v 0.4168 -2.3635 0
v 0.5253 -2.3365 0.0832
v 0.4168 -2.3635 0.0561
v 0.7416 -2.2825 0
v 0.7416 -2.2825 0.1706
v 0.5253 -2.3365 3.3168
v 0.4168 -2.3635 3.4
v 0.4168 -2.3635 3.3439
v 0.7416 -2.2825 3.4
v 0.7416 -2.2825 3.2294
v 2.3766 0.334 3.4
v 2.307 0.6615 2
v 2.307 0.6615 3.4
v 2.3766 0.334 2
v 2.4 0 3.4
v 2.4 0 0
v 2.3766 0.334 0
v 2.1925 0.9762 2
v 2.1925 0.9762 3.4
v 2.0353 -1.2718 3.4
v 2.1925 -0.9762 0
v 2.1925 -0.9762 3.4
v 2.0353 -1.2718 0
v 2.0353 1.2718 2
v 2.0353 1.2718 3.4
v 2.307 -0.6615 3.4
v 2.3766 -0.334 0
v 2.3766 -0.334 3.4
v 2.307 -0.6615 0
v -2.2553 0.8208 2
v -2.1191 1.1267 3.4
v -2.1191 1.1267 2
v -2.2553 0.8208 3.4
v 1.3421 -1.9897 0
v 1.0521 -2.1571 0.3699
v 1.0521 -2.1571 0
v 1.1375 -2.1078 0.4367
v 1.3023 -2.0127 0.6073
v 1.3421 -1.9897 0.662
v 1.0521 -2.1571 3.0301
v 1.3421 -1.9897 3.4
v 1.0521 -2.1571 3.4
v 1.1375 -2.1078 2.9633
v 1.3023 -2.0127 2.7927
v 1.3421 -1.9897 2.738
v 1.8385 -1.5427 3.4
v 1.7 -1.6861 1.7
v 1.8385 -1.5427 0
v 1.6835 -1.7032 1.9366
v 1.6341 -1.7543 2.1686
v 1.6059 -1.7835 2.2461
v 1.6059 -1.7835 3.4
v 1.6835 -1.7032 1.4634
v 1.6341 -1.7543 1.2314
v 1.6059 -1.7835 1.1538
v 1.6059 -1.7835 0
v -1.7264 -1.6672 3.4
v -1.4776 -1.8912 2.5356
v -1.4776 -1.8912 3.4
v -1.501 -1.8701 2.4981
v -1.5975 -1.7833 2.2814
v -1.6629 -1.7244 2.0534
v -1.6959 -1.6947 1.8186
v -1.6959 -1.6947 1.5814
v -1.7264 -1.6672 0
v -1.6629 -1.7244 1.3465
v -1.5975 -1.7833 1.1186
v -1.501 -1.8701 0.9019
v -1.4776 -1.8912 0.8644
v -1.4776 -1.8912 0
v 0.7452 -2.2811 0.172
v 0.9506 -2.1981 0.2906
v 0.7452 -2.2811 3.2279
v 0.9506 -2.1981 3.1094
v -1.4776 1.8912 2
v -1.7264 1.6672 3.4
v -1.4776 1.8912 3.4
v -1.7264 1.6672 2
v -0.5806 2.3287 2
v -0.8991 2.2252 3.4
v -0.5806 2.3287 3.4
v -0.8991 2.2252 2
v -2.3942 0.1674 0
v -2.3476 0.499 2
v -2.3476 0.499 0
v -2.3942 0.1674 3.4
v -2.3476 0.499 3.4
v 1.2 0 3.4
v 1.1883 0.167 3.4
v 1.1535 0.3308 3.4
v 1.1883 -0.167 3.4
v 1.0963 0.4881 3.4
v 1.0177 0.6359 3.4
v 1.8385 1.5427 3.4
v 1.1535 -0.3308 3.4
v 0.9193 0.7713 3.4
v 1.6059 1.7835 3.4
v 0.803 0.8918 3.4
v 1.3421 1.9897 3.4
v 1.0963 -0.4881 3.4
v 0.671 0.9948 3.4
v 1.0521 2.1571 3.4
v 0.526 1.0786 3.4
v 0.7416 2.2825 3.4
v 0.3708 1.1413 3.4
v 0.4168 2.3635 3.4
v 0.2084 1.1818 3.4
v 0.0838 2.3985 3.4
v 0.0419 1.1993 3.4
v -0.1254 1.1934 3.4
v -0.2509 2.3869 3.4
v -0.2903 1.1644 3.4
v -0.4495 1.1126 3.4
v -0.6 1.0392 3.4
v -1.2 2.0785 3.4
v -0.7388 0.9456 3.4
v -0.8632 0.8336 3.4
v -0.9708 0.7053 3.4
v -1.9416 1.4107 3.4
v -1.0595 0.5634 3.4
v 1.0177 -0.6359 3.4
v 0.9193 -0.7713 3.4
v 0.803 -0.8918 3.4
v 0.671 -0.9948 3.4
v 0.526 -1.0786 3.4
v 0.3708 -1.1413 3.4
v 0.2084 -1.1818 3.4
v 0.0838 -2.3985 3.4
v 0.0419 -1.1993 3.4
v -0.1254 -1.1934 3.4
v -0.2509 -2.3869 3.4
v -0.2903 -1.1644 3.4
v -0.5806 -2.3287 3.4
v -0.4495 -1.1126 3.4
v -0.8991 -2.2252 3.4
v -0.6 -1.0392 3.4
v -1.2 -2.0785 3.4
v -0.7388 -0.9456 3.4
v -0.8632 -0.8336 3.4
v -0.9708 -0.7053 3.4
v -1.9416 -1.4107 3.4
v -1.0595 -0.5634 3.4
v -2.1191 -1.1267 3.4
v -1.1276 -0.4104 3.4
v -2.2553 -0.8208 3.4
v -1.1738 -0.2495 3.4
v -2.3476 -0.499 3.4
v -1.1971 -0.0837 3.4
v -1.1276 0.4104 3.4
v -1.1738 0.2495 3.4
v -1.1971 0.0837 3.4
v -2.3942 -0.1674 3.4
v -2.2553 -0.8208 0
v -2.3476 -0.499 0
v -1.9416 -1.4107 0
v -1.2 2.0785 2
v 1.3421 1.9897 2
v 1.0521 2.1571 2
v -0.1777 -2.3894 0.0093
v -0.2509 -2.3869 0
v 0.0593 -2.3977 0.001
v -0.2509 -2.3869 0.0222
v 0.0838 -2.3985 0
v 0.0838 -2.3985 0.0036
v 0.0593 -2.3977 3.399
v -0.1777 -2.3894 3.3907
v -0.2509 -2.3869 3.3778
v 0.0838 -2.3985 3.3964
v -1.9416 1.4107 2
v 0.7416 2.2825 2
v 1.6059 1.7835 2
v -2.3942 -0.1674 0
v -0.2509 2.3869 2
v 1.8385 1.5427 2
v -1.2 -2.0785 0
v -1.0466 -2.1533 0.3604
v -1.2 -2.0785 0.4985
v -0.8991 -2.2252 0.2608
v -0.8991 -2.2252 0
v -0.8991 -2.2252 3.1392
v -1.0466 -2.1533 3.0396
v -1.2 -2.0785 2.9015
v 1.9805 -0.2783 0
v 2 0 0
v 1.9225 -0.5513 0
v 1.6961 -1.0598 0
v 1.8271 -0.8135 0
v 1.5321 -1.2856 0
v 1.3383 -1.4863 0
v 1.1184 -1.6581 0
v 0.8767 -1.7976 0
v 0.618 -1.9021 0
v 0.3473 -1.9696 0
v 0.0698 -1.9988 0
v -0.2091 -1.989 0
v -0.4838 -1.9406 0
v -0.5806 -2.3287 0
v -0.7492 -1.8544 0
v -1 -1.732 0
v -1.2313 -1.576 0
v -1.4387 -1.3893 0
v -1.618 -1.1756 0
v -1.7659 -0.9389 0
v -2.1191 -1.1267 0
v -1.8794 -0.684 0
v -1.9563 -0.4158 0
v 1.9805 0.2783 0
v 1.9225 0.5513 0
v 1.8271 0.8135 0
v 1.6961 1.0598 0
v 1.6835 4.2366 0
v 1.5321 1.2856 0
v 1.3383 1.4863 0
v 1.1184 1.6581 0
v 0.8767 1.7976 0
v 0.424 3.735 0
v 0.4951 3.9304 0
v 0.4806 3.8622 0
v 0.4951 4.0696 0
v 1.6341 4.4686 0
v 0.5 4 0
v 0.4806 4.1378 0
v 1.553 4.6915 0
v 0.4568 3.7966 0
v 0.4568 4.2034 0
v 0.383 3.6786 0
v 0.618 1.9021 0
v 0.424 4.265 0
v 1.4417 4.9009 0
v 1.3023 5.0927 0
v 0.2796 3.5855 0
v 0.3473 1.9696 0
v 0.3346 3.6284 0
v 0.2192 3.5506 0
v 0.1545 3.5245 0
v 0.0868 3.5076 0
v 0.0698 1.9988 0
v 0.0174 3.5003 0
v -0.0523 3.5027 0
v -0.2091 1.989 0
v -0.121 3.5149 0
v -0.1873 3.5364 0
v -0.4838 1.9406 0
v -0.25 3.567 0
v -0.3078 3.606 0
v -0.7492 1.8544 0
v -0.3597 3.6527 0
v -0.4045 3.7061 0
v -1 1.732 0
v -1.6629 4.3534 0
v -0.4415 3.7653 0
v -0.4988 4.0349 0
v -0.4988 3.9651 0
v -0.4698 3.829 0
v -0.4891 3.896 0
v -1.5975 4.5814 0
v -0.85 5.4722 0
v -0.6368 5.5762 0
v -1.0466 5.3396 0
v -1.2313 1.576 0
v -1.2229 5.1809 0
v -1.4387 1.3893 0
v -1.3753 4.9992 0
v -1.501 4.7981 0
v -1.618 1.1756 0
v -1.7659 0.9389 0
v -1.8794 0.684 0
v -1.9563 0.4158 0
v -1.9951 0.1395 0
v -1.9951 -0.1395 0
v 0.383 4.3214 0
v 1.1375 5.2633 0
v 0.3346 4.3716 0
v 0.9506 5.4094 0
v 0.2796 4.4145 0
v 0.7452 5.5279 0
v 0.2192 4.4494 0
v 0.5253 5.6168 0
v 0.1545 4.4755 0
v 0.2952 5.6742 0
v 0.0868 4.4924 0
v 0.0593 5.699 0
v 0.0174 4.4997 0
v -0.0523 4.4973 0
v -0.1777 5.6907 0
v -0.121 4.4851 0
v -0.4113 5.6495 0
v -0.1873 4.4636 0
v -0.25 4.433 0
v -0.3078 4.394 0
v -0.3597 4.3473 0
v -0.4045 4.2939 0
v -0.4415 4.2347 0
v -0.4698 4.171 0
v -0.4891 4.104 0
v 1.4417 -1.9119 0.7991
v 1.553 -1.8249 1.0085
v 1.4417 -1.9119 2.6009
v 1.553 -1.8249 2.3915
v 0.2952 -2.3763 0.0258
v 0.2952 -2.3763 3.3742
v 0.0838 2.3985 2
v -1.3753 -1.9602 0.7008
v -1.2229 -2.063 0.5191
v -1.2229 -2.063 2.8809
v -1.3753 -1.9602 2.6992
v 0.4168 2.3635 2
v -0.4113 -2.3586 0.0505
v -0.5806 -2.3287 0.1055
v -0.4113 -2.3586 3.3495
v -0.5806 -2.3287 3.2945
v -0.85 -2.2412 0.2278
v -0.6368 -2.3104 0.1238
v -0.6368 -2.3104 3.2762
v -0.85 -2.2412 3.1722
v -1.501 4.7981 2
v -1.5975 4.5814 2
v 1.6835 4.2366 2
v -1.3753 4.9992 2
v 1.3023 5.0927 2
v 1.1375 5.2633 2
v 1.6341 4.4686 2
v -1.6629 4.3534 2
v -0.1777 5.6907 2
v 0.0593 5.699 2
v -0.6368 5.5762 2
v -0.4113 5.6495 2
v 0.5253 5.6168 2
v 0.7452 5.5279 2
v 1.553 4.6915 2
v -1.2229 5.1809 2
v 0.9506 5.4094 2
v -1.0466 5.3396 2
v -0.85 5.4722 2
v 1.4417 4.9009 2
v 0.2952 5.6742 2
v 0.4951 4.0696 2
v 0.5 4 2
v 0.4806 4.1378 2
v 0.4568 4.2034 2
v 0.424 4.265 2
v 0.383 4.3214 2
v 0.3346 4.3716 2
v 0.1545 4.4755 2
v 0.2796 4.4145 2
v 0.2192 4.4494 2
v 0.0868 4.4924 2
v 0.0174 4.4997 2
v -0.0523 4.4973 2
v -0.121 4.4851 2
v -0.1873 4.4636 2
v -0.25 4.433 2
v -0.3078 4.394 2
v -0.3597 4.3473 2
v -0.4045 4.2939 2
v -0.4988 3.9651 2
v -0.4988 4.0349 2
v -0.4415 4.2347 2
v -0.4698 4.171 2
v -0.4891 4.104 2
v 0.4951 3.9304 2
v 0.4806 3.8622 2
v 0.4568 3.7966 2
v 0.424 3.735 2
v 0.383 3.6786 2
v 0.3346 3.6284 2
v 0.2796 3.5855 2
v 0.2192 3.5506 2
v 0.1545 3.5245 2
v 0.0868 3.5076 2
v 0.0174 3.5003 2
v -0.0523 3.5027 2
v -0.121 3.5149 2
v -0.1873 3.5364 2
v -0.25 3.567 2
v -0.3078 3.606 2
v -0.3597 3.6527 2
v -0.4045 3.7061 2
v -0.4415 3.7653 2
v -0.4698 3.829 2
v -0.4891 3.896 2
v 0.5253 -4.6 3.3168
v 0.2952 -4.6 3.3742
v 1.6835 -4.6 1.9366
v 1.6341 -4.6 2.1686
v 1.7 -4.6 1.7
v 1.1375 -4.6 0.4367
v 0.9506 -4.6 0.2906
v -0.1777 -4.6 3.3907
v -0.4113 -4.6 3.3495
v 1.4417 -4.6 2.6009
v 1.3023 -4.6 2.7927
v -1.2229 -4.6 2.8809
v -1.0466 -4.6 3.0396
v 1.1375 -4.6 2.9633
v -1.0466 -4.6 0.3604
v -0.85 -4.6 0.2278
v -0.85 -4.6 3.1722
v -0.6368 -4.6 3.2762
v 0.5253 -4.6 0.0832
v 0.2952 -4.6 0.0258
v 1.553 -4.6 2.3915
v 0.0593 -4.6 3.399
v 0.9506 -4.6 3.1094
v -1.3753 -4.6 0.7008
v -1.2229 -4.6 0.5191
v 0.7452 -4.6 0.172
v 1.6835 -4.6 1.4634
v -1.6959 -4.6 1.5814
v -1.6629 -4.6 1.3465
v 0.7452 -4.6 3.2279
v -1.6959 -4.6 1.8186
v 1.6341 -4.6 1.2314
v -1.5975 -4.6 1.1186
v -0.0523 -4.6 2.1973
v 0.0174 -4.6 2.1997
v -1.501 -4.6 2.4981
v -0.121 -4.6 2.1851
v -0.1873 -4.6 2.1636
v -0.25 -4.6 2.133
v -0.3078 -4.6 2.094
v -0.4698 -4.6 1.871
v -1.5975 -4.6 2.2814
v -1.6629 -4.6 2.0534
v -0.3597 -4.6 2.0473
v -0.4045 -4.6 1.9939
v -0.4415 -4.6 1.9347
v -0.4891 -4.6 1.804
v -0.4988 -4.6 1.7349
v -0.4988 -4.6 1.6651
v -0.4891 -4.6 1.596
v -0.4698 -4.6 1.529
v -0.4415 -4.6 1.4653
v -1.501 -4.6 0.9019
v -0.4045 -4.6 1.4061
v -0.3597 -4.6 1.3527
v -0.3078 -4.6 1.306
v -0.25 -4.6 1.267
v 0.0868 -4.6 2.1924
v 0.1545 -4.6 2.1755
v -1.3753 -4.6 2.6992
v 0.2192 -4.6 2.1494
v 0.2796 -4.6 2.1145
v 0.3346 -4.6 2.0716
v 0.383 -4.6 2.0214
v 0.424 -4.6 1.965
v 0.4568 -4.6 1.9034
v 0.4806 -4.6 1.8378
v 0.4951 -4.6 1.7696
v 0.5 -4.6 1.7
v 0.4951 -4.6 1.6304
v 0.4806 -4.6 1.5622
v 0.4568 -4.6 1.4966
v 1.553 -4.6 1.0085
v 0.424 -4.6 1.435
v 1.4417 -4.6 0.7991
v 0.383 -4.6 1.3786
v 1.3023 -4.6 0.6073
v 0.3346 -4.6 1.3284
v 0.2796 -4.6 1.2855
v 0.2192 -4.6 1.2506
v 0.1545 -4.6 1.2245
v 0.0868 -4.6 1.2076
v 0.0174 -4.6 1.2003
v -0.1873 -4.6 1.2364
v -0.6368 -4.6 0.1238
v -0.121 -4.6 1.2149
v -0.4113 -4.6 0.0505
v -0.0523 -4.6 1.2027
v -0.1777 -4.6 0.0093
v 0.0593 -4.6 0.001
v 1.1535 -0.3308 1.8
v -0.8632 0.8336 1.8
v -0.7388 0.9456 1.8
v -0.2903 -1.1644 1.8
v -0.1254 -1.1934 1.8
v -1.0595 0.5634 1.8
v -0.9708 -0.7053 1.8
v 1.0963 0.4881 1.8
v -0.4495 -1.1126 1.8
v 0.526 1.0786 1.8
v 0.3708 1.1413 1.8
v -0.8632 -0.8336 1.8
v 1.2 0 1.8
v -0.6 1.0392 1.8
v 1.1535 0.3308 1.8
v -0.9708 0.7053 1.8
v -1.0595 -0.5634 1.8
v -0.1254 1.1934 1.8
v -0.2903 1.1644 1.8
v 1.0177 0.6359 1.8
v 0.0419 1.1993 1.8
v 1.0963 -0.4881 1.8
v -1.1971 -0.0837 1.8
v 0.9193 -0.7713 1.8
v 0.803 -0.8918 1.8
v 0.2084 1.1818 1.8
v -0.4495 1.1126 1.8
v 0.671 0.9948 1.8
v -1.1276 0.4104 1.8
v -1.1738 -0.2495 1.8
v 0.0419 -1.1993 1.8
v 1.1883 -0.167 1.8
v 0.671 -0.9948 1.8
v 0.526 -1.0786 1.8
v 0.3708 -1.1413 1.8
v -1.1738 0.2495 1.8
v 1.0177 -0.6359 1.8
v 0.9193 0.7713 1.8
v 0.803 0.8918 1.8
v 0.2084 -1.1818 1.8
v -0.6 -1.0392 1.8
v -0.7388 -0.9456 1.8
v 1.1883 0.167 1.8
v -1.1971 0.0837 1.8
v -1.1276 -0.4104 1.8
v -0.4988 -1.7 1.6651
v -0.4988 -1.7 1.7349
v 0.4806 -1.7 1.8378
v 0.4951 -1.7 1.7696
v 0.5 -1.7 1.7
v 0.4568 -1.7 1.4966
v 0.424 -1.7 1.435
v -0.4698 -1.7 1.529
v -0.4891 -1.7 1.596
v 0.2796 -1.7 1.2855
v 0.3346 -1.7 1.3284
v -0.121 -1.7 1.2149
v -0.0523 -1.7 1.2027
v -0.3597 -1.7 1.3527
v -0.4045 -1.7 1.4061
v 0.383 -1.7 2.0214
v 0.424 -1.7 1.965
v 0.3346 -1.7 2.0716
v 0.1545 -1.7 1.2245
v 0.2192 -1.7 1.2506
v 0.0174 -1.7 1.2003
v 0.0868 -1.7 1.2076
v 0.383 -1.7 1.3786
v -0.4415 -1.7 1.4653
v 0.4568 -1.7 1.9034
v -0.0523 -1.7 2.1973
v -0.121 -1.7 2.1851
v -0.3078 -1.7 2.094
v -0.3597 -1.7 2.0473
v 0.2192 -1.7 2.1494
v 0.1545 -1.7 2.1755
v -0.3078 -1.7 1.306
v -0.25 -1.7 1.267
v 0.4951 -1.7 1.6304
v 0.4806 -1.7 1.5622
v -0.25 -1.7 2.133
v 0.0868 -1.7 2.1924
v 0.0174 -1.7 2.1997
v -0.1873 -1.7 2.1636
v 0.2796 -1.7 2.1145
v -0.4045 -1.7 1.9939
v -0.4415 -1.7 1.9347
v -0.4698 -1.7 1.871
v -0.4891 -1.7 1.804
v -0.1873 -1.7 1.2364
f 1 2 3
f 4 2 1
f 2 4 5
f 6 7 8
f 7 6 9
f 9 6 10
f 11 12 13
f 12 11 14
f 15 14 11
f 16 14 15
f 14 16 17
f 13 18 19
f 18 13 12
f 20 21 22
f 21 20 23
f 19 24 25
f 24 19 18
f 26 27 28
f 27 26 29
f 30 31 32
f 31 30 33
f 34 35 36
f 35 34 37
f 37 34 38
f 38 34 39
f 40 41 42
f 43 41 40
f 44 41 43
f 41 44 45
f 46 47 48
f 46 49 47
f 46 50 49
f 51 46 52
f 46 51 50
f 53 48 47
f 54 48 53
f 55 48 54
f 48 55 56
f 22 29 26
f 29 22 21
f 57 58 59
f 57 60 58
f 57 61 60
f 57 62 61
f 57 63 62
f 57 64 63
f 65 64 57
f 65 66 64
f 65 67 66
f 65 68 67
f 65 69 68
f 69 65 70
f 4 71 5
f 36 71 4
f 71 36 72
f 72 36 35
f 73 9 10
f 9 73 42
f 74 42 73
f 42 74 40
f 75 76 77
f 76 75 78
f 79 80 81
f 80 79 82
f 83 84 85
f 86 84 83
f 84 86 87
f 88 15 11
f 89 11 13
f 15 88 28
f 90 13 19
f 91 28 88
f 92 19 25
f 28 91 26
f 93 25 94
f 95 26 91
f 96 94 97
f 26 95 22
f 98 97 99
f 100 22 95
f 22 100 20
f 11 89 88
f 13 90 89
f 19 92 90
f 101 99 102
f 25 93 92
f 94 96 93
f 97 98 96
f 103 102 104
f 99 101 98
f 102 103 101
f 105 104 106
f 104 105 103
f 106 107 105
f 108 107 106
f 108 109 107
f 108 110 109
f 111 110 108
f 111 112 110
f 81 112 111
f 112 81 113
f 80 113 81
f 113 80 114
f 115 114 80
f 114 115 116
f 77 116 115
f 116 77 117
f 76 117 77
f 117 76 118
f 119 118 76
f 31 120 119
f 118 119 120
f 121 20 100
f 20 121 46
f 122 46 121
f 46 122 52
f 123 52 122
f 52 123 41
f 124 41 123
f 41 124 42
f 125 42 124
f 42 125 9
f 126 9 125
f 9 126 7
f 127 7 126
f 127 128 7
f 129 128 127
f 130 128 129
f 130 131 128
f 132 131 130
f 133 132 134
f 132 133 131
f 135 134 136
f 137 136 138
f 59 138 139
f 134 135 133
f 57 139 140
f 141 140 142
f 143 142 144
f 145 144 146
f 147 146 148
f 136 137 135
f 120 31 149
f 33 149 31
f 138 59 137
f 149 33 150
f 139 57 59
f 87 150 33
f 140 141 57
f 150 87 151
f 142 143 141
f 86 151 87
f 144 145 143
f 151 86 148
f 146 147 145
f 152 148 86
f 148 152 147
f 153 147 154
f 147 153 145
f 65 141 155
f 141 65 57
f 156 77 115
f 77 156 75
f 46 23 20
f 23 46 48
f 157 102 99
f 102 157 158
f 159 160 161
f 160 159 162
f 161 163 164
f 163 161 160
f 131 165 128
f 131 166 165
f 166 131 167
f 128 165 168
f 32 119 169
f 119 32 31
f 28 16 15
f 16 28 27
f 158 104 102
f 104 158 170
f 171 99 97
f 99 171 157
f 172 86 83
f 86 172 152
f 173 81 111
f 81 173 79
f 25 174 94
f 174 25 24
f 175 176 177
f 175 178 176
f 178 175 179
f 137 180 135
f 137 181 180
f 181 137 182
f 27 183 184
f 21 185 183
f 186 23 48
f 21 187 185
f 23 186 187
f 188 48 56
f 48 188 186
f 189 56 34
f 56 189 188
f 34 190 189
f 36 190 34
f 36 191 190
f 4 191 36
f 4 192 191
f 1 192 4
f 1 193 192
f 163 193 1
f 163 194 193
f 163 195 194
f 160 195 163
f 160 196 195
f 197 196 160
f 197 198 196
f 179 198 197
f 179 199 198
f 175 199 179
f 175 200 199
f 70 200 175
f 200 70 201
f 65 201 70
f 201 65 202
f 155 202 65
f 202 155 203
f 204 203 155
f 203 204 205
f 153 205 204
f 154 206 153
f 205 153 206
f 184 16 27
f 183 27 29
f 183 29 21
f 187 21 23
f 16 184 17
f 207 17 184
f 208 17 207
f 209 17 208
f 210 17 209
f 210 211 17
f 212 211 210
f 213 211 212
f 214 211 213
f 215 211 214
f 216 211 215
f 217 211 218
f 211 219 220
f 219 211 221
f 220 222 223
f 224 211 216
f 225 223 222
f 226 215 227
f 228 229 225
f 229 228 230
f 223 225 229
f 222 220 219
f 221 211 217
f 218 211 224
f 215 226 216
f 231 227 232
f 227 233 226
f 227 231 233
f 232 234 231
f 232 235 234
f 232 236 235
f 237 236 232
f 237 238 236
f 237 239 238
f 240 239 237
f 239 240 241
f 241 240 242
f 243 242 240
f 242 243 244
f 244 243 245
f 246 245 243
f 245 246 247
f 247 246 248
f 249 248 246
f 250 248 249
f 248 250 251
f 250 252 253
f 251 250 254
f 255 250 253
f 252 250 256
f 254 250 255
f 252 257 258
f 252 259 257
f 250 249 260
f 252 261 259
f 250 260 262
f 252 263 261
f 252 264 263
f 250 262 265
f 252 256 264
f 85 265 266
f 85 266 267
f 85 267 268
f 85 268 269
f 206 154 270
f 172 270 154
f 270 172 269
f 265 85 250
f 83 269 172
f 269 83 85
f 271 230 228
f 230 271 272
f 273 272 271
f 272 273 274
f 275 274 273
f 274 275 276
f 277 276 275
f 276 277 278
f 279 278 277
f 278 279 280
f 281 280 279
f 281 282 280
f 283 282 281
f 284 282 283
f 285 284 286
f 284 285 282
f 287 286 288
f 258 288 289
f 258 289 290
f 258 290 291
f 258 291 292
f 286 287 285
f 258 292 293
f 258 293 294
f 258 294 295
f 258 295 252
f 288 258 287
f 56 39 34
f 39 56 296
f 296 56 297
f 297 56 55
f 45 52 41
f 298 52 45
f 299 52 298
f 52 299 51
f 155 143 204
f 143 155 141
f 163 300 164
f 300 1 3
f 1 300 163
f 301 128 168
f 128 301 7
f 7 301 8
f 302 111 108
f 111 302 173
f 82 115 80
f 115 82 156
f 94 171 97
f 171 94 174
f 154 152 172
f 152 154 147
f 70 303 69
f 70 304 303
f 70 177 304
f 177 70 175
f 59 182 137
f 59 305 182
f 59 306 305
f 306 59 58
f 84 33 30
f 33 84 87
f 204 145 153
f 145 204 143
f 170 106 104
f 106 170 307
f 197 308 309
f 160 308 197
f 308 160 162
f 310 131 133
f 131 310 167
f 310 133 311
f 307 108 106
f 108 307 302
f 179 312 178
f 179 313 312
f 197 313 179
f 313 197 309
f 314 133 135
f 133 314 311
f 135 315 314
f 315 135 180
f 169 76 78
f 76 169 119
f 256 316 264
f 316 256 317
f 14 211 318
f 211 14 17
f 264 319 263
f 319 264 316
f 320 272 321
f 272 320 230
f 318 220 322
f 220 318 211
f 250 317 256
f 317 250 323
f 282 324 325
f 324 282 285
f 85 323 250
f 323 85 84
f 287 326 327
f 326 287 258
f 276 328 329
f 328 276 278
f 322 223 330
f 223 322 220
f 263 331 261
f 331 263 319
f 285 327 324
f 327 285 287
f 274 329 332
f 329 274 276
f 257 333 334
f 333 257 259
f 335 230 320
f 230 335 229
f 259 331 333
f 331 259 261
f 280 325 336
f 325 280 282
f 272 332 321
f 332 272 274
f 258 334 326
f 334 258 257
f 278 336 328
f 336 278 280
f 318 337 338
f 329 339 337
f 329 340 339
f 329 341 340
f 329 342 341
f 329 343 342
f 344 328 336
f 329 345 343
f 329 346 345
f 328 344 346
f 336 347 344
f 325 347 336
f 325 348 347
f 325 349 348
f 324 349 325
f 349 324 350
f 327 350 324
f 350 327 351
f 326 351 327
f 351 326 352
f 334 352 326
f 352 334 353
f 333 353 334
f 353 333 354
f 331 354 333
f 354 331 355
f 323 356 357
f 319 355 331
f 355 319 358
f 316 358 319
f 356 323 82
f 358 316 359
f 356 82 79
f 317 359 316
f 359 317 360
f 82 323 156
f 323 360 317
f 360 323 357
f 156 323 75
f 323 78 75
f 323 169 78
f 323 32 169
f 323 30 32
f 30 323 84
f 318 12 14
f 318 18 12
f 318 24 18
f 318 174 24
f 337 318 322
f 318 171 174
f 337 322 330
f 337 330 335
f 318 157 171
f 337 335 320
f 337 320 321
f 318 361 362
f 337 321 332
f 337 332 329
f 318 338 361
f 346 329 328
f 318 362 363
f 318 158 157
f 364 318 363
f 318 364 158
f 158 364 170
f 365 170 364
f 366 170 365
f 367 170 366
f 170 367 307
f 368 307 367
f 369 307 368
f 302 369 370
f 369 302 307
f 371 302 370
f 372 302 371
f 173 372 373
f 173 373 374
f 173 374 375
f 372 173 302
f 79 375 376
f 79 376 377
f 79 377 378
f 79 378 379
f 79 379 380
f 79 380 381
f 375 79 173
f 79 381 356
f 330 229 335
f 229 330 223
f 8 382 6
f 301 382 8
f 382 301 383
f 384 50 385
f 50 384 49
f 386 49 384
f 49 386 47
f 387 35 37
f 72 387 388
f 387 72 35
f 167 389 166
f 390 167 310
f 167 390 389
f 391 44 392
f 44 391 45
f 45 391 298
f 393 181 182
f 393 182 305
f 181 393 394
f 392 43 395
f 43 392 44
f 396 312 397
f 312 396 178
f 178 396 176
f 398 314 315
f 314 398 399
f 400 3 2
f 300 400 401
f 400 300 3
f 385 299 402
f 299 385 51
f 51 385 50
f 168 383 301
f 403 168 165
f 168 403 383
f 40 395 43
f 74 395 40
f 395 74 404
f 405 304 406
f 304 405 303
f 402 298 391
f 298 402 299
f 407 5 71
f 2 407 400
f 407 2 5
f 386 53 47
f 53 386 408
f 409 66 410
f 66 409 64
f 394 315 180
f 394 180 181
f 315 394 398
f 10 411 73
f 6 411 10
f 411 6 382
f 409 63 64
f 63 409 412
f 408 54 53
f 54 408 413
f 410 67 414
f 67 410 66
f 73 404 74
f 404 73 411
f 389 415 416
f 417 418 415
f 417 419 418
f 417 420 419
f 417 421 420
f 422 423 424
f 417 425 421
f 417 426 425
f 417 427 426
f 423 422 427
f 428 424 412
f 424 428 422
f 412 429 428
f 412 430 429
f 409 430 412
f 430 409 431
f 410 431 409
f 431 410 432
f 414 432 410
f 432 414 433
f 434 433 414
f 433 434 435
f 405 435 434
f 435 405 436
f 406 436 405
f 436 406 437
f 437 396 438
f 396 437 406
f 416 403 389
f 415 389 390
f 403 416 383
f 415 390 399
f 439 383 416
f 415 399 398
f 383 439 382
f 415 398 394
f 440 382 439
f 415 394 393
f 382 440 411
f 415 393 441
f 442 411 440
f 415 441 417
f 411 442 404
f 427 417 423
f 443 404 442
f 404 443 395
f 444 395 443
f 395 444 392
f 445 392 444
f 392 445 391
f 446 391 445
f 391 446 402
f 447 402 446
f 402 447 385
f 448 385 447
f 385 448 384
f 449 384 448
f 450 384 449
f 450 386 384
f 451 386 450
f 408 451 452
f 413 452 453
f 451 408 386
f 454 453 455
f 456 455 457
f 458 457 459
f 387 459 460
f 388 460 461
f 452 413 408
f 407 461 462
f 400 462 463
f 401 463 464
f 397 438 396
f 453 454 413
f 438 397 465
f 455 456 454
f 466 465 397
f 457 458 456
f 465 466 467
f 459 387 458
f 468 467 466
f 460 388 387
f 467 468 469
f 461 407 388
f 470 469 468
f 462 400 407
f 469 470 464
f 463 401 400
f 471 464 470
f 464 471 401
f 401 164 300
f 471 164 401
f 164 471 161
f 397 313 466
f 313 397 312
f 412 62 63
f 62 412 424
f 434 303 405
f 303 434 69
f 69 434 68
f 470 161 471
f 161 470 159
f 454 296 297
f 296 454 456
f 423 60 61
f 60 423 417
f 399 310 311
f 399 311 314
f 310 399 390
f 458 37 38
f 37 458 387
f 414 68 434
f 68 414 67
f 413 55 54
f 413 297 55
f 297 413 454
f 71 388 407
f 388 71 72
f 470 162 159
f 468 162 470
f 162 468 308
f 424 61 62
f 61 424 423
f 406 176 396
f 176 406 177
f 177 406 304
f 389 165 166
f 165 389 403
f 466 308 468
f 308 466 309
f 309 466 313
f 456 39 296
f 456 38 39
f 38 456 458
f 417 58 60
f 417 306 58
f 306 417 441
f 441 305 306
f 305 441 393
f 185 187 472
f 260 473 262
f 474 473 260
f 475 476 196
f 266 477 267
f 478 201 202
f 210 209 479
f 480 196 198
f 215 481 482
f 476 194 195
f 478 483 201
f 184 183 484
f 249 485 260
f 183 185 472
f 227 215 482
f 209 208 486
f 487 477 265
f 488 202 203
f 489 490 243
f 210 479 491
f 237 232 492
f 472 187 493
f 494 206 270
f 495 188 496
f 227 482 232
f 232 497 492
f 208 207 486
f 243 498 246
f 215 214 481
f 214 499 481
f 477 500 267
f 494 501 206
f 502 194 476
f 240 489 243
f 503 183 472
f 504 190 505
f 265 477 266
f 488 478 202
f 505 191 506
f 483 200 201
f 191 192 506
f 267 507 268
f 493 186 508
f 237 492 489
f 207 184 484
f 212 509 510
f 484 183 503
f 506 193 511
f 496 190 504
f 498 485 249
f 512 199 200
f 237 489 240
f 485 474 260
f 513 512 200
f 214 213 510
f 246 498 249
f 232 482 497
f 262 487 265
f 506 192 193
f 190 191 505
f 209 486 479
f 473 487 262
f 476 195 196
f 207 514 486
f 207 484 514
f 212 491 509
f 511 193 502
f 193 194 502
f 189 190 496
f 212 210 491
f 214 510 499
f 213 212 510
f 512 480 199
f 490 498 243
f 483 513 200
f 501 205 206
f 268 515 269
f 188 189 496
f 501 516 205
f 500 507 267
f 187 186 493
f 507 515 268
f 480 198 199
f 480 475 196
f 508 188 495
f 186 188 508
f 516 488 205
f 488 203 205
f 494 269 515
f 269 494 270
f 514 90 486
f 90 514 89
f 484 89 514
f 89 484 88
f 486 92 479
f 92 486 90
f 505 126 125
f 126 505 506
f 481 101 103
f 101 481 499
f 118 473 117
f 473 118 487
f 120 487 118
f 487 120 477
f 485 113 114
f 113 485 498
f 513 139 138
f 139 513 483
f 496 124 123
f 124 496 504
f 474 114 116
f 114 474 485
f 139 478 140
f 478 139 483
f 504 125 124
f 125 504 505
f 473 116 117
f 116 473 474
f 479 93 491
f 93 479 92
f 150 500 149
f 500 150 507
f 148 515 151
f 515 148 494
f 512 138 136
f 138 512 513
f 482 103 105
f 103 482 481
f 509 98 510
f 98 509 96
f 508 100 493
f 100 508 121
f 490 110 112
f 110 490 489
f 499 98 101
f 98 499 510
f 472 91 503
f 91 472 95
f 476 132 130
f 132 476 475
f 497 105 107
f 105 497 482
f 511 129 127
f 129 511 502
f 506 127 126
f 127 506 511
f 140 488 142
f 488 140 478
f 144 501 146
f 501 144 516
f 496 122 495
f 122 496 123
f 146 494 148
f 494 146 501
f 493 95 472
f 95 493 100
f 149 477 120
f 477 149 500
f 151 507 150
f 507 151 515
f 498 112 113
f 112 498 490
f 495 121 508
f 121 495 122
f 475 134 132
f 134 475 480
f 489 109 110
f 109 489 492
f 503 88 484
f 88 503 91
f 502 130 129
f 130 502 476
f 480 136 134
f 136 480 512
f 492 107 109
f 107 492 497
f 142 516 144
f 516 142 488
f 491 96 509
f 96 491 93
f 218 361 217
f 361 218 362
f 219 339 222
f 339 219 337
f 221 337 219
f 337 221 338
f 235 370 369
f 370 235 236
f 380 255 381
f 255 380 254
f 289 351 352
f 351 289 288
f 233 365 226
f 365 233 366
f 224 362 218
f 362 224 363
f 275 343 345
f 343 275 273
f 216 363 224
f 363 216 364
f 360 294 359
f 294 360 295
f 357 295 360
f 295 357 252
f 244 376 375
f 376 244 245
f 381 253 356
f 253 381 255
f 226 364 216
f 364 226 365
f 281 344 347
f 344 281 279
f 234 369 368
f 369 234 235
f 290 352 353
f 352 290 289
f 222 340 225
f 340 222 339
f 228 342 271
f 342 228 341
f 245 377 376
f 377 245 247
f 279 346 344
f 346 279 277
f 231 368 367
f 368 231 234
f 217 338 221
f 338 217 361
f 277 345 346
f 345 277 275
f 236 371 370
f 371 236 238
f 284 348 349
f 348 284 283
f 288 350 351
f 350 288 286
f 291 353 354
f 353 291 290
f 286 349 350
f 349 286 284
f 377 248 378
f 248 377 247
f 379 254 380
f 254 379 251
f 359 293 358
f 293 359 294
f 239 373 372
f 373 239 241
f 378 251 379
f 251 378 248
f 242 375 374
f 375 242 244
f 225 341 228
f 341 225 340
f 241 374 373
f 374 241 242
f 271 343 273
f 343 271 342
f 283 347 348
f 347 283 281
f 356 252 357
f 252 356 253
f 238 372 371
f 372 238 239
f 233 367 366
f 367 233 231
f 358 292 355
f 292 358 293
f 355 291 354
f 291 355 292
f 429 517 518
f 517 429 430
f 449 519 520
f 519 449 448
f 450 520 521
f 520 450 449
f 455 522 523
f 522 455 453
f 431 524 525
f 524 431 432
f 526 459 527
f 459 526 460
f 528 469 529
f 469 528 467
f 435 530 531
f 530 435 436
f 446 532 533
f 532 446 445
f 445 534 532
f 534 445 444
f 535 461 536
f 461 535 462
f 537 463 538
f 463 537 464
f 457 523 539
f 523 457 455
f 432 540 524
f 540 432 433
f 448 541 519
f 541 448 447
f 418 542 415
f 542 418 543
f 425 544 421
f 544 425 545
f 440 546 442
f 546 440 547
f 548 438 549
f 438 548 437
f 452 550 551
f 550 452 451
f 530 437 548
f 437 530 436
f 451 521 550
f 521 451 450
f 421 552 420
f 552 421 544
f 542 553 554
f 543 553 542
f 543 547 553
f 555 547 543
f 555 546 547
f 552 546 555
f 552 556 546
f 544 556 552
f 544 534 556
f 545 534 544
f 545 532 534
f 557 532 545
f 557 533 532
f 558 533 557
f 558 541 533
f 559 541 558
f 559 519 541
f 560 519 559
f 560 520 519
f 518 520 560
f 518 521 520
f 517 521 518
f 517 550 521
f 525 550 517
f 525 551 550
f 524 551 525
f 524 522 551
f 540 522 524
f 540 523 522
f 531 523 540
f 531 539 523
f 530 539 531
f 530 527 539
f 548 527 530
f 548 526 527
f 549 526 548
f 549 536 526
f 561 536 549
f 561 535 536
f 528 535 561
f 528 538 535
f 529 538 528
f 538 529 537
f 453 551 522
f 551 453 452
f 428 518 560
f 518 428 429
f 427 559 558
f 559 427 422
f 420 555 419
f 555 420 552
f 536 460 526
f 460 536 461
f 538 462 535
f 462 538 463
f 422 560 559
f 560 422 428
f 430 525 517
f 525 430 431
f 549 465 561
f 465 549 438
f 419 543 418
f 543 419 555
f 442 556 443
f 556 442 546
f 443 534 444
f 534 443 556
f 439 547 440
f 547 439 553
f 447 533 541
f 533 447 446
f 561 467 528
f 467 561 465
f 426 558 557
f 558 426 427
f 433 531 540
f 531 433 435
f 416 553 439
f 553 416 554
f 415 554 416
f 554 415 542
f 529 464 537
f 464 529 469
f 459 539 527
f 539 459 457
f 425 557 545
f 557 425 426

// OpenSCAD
canopyHoleDiameter = 1.0;
frameHoleDiameter = 2.4;
frameHoleBottomDiameter = 4;
frameHoleOffset = 0;
boardHoleDiameter = 1.0;
boardHoleOffset = 4;
canopyOffset = 2.2;

walls = 1.2;

height = 3.4;
heightBoard = 2;

$fn = 45;

frameHoleRadius = frameHoleDiameter / 2;
boardHoleRadius = boardHoleDiameter / 2;
canopyHoleRadius = canopyHoleDiameter / 2;
frameHoleBottomRadius = frameHoleBottomDiameter / 2;

difference() {
  group() {
    cylinder(r = frameHoleRadius + walls, h = height);

    hull() {
      cylinder(r = frameHoleRadius + walls, h = heightBoard);
      translate([0, boardHoleOffset, 0])
        cylinder(r = boardHoleRadius + walls, h = heightBoard);
    }
    
    translate([0, 0, height/2])
      rotate([90,0,0])
        cylinder(r = height / 2, h = canopyOffset + frameHoleRadius + walls);
  }

  hull() {
    translate([0, 0, -0.1])
      cylinder(r = frameHoleBottomRadius, h = 0.1);
    translate([0, 0, height / 2 - frameHoleOffset])
      cylinder(r = frameHoleRadius, h = 0.1);
  }
  
  translate([0, 0, -1])
    cylinder(r = frameHoleRadius, h = height + 2);

  translate([0, boardHoleOffset, -1])
    cylinder(r = boardHoleRadius, h = heightBoard + 2);
  
  translate([0, -walls - boardHoleRadius, height/2])
      rotate([90,0,0])
        cylinder(r = canopyHoleRadius, h = canopyOffset + frameHoleRadius + walls);
}
  
